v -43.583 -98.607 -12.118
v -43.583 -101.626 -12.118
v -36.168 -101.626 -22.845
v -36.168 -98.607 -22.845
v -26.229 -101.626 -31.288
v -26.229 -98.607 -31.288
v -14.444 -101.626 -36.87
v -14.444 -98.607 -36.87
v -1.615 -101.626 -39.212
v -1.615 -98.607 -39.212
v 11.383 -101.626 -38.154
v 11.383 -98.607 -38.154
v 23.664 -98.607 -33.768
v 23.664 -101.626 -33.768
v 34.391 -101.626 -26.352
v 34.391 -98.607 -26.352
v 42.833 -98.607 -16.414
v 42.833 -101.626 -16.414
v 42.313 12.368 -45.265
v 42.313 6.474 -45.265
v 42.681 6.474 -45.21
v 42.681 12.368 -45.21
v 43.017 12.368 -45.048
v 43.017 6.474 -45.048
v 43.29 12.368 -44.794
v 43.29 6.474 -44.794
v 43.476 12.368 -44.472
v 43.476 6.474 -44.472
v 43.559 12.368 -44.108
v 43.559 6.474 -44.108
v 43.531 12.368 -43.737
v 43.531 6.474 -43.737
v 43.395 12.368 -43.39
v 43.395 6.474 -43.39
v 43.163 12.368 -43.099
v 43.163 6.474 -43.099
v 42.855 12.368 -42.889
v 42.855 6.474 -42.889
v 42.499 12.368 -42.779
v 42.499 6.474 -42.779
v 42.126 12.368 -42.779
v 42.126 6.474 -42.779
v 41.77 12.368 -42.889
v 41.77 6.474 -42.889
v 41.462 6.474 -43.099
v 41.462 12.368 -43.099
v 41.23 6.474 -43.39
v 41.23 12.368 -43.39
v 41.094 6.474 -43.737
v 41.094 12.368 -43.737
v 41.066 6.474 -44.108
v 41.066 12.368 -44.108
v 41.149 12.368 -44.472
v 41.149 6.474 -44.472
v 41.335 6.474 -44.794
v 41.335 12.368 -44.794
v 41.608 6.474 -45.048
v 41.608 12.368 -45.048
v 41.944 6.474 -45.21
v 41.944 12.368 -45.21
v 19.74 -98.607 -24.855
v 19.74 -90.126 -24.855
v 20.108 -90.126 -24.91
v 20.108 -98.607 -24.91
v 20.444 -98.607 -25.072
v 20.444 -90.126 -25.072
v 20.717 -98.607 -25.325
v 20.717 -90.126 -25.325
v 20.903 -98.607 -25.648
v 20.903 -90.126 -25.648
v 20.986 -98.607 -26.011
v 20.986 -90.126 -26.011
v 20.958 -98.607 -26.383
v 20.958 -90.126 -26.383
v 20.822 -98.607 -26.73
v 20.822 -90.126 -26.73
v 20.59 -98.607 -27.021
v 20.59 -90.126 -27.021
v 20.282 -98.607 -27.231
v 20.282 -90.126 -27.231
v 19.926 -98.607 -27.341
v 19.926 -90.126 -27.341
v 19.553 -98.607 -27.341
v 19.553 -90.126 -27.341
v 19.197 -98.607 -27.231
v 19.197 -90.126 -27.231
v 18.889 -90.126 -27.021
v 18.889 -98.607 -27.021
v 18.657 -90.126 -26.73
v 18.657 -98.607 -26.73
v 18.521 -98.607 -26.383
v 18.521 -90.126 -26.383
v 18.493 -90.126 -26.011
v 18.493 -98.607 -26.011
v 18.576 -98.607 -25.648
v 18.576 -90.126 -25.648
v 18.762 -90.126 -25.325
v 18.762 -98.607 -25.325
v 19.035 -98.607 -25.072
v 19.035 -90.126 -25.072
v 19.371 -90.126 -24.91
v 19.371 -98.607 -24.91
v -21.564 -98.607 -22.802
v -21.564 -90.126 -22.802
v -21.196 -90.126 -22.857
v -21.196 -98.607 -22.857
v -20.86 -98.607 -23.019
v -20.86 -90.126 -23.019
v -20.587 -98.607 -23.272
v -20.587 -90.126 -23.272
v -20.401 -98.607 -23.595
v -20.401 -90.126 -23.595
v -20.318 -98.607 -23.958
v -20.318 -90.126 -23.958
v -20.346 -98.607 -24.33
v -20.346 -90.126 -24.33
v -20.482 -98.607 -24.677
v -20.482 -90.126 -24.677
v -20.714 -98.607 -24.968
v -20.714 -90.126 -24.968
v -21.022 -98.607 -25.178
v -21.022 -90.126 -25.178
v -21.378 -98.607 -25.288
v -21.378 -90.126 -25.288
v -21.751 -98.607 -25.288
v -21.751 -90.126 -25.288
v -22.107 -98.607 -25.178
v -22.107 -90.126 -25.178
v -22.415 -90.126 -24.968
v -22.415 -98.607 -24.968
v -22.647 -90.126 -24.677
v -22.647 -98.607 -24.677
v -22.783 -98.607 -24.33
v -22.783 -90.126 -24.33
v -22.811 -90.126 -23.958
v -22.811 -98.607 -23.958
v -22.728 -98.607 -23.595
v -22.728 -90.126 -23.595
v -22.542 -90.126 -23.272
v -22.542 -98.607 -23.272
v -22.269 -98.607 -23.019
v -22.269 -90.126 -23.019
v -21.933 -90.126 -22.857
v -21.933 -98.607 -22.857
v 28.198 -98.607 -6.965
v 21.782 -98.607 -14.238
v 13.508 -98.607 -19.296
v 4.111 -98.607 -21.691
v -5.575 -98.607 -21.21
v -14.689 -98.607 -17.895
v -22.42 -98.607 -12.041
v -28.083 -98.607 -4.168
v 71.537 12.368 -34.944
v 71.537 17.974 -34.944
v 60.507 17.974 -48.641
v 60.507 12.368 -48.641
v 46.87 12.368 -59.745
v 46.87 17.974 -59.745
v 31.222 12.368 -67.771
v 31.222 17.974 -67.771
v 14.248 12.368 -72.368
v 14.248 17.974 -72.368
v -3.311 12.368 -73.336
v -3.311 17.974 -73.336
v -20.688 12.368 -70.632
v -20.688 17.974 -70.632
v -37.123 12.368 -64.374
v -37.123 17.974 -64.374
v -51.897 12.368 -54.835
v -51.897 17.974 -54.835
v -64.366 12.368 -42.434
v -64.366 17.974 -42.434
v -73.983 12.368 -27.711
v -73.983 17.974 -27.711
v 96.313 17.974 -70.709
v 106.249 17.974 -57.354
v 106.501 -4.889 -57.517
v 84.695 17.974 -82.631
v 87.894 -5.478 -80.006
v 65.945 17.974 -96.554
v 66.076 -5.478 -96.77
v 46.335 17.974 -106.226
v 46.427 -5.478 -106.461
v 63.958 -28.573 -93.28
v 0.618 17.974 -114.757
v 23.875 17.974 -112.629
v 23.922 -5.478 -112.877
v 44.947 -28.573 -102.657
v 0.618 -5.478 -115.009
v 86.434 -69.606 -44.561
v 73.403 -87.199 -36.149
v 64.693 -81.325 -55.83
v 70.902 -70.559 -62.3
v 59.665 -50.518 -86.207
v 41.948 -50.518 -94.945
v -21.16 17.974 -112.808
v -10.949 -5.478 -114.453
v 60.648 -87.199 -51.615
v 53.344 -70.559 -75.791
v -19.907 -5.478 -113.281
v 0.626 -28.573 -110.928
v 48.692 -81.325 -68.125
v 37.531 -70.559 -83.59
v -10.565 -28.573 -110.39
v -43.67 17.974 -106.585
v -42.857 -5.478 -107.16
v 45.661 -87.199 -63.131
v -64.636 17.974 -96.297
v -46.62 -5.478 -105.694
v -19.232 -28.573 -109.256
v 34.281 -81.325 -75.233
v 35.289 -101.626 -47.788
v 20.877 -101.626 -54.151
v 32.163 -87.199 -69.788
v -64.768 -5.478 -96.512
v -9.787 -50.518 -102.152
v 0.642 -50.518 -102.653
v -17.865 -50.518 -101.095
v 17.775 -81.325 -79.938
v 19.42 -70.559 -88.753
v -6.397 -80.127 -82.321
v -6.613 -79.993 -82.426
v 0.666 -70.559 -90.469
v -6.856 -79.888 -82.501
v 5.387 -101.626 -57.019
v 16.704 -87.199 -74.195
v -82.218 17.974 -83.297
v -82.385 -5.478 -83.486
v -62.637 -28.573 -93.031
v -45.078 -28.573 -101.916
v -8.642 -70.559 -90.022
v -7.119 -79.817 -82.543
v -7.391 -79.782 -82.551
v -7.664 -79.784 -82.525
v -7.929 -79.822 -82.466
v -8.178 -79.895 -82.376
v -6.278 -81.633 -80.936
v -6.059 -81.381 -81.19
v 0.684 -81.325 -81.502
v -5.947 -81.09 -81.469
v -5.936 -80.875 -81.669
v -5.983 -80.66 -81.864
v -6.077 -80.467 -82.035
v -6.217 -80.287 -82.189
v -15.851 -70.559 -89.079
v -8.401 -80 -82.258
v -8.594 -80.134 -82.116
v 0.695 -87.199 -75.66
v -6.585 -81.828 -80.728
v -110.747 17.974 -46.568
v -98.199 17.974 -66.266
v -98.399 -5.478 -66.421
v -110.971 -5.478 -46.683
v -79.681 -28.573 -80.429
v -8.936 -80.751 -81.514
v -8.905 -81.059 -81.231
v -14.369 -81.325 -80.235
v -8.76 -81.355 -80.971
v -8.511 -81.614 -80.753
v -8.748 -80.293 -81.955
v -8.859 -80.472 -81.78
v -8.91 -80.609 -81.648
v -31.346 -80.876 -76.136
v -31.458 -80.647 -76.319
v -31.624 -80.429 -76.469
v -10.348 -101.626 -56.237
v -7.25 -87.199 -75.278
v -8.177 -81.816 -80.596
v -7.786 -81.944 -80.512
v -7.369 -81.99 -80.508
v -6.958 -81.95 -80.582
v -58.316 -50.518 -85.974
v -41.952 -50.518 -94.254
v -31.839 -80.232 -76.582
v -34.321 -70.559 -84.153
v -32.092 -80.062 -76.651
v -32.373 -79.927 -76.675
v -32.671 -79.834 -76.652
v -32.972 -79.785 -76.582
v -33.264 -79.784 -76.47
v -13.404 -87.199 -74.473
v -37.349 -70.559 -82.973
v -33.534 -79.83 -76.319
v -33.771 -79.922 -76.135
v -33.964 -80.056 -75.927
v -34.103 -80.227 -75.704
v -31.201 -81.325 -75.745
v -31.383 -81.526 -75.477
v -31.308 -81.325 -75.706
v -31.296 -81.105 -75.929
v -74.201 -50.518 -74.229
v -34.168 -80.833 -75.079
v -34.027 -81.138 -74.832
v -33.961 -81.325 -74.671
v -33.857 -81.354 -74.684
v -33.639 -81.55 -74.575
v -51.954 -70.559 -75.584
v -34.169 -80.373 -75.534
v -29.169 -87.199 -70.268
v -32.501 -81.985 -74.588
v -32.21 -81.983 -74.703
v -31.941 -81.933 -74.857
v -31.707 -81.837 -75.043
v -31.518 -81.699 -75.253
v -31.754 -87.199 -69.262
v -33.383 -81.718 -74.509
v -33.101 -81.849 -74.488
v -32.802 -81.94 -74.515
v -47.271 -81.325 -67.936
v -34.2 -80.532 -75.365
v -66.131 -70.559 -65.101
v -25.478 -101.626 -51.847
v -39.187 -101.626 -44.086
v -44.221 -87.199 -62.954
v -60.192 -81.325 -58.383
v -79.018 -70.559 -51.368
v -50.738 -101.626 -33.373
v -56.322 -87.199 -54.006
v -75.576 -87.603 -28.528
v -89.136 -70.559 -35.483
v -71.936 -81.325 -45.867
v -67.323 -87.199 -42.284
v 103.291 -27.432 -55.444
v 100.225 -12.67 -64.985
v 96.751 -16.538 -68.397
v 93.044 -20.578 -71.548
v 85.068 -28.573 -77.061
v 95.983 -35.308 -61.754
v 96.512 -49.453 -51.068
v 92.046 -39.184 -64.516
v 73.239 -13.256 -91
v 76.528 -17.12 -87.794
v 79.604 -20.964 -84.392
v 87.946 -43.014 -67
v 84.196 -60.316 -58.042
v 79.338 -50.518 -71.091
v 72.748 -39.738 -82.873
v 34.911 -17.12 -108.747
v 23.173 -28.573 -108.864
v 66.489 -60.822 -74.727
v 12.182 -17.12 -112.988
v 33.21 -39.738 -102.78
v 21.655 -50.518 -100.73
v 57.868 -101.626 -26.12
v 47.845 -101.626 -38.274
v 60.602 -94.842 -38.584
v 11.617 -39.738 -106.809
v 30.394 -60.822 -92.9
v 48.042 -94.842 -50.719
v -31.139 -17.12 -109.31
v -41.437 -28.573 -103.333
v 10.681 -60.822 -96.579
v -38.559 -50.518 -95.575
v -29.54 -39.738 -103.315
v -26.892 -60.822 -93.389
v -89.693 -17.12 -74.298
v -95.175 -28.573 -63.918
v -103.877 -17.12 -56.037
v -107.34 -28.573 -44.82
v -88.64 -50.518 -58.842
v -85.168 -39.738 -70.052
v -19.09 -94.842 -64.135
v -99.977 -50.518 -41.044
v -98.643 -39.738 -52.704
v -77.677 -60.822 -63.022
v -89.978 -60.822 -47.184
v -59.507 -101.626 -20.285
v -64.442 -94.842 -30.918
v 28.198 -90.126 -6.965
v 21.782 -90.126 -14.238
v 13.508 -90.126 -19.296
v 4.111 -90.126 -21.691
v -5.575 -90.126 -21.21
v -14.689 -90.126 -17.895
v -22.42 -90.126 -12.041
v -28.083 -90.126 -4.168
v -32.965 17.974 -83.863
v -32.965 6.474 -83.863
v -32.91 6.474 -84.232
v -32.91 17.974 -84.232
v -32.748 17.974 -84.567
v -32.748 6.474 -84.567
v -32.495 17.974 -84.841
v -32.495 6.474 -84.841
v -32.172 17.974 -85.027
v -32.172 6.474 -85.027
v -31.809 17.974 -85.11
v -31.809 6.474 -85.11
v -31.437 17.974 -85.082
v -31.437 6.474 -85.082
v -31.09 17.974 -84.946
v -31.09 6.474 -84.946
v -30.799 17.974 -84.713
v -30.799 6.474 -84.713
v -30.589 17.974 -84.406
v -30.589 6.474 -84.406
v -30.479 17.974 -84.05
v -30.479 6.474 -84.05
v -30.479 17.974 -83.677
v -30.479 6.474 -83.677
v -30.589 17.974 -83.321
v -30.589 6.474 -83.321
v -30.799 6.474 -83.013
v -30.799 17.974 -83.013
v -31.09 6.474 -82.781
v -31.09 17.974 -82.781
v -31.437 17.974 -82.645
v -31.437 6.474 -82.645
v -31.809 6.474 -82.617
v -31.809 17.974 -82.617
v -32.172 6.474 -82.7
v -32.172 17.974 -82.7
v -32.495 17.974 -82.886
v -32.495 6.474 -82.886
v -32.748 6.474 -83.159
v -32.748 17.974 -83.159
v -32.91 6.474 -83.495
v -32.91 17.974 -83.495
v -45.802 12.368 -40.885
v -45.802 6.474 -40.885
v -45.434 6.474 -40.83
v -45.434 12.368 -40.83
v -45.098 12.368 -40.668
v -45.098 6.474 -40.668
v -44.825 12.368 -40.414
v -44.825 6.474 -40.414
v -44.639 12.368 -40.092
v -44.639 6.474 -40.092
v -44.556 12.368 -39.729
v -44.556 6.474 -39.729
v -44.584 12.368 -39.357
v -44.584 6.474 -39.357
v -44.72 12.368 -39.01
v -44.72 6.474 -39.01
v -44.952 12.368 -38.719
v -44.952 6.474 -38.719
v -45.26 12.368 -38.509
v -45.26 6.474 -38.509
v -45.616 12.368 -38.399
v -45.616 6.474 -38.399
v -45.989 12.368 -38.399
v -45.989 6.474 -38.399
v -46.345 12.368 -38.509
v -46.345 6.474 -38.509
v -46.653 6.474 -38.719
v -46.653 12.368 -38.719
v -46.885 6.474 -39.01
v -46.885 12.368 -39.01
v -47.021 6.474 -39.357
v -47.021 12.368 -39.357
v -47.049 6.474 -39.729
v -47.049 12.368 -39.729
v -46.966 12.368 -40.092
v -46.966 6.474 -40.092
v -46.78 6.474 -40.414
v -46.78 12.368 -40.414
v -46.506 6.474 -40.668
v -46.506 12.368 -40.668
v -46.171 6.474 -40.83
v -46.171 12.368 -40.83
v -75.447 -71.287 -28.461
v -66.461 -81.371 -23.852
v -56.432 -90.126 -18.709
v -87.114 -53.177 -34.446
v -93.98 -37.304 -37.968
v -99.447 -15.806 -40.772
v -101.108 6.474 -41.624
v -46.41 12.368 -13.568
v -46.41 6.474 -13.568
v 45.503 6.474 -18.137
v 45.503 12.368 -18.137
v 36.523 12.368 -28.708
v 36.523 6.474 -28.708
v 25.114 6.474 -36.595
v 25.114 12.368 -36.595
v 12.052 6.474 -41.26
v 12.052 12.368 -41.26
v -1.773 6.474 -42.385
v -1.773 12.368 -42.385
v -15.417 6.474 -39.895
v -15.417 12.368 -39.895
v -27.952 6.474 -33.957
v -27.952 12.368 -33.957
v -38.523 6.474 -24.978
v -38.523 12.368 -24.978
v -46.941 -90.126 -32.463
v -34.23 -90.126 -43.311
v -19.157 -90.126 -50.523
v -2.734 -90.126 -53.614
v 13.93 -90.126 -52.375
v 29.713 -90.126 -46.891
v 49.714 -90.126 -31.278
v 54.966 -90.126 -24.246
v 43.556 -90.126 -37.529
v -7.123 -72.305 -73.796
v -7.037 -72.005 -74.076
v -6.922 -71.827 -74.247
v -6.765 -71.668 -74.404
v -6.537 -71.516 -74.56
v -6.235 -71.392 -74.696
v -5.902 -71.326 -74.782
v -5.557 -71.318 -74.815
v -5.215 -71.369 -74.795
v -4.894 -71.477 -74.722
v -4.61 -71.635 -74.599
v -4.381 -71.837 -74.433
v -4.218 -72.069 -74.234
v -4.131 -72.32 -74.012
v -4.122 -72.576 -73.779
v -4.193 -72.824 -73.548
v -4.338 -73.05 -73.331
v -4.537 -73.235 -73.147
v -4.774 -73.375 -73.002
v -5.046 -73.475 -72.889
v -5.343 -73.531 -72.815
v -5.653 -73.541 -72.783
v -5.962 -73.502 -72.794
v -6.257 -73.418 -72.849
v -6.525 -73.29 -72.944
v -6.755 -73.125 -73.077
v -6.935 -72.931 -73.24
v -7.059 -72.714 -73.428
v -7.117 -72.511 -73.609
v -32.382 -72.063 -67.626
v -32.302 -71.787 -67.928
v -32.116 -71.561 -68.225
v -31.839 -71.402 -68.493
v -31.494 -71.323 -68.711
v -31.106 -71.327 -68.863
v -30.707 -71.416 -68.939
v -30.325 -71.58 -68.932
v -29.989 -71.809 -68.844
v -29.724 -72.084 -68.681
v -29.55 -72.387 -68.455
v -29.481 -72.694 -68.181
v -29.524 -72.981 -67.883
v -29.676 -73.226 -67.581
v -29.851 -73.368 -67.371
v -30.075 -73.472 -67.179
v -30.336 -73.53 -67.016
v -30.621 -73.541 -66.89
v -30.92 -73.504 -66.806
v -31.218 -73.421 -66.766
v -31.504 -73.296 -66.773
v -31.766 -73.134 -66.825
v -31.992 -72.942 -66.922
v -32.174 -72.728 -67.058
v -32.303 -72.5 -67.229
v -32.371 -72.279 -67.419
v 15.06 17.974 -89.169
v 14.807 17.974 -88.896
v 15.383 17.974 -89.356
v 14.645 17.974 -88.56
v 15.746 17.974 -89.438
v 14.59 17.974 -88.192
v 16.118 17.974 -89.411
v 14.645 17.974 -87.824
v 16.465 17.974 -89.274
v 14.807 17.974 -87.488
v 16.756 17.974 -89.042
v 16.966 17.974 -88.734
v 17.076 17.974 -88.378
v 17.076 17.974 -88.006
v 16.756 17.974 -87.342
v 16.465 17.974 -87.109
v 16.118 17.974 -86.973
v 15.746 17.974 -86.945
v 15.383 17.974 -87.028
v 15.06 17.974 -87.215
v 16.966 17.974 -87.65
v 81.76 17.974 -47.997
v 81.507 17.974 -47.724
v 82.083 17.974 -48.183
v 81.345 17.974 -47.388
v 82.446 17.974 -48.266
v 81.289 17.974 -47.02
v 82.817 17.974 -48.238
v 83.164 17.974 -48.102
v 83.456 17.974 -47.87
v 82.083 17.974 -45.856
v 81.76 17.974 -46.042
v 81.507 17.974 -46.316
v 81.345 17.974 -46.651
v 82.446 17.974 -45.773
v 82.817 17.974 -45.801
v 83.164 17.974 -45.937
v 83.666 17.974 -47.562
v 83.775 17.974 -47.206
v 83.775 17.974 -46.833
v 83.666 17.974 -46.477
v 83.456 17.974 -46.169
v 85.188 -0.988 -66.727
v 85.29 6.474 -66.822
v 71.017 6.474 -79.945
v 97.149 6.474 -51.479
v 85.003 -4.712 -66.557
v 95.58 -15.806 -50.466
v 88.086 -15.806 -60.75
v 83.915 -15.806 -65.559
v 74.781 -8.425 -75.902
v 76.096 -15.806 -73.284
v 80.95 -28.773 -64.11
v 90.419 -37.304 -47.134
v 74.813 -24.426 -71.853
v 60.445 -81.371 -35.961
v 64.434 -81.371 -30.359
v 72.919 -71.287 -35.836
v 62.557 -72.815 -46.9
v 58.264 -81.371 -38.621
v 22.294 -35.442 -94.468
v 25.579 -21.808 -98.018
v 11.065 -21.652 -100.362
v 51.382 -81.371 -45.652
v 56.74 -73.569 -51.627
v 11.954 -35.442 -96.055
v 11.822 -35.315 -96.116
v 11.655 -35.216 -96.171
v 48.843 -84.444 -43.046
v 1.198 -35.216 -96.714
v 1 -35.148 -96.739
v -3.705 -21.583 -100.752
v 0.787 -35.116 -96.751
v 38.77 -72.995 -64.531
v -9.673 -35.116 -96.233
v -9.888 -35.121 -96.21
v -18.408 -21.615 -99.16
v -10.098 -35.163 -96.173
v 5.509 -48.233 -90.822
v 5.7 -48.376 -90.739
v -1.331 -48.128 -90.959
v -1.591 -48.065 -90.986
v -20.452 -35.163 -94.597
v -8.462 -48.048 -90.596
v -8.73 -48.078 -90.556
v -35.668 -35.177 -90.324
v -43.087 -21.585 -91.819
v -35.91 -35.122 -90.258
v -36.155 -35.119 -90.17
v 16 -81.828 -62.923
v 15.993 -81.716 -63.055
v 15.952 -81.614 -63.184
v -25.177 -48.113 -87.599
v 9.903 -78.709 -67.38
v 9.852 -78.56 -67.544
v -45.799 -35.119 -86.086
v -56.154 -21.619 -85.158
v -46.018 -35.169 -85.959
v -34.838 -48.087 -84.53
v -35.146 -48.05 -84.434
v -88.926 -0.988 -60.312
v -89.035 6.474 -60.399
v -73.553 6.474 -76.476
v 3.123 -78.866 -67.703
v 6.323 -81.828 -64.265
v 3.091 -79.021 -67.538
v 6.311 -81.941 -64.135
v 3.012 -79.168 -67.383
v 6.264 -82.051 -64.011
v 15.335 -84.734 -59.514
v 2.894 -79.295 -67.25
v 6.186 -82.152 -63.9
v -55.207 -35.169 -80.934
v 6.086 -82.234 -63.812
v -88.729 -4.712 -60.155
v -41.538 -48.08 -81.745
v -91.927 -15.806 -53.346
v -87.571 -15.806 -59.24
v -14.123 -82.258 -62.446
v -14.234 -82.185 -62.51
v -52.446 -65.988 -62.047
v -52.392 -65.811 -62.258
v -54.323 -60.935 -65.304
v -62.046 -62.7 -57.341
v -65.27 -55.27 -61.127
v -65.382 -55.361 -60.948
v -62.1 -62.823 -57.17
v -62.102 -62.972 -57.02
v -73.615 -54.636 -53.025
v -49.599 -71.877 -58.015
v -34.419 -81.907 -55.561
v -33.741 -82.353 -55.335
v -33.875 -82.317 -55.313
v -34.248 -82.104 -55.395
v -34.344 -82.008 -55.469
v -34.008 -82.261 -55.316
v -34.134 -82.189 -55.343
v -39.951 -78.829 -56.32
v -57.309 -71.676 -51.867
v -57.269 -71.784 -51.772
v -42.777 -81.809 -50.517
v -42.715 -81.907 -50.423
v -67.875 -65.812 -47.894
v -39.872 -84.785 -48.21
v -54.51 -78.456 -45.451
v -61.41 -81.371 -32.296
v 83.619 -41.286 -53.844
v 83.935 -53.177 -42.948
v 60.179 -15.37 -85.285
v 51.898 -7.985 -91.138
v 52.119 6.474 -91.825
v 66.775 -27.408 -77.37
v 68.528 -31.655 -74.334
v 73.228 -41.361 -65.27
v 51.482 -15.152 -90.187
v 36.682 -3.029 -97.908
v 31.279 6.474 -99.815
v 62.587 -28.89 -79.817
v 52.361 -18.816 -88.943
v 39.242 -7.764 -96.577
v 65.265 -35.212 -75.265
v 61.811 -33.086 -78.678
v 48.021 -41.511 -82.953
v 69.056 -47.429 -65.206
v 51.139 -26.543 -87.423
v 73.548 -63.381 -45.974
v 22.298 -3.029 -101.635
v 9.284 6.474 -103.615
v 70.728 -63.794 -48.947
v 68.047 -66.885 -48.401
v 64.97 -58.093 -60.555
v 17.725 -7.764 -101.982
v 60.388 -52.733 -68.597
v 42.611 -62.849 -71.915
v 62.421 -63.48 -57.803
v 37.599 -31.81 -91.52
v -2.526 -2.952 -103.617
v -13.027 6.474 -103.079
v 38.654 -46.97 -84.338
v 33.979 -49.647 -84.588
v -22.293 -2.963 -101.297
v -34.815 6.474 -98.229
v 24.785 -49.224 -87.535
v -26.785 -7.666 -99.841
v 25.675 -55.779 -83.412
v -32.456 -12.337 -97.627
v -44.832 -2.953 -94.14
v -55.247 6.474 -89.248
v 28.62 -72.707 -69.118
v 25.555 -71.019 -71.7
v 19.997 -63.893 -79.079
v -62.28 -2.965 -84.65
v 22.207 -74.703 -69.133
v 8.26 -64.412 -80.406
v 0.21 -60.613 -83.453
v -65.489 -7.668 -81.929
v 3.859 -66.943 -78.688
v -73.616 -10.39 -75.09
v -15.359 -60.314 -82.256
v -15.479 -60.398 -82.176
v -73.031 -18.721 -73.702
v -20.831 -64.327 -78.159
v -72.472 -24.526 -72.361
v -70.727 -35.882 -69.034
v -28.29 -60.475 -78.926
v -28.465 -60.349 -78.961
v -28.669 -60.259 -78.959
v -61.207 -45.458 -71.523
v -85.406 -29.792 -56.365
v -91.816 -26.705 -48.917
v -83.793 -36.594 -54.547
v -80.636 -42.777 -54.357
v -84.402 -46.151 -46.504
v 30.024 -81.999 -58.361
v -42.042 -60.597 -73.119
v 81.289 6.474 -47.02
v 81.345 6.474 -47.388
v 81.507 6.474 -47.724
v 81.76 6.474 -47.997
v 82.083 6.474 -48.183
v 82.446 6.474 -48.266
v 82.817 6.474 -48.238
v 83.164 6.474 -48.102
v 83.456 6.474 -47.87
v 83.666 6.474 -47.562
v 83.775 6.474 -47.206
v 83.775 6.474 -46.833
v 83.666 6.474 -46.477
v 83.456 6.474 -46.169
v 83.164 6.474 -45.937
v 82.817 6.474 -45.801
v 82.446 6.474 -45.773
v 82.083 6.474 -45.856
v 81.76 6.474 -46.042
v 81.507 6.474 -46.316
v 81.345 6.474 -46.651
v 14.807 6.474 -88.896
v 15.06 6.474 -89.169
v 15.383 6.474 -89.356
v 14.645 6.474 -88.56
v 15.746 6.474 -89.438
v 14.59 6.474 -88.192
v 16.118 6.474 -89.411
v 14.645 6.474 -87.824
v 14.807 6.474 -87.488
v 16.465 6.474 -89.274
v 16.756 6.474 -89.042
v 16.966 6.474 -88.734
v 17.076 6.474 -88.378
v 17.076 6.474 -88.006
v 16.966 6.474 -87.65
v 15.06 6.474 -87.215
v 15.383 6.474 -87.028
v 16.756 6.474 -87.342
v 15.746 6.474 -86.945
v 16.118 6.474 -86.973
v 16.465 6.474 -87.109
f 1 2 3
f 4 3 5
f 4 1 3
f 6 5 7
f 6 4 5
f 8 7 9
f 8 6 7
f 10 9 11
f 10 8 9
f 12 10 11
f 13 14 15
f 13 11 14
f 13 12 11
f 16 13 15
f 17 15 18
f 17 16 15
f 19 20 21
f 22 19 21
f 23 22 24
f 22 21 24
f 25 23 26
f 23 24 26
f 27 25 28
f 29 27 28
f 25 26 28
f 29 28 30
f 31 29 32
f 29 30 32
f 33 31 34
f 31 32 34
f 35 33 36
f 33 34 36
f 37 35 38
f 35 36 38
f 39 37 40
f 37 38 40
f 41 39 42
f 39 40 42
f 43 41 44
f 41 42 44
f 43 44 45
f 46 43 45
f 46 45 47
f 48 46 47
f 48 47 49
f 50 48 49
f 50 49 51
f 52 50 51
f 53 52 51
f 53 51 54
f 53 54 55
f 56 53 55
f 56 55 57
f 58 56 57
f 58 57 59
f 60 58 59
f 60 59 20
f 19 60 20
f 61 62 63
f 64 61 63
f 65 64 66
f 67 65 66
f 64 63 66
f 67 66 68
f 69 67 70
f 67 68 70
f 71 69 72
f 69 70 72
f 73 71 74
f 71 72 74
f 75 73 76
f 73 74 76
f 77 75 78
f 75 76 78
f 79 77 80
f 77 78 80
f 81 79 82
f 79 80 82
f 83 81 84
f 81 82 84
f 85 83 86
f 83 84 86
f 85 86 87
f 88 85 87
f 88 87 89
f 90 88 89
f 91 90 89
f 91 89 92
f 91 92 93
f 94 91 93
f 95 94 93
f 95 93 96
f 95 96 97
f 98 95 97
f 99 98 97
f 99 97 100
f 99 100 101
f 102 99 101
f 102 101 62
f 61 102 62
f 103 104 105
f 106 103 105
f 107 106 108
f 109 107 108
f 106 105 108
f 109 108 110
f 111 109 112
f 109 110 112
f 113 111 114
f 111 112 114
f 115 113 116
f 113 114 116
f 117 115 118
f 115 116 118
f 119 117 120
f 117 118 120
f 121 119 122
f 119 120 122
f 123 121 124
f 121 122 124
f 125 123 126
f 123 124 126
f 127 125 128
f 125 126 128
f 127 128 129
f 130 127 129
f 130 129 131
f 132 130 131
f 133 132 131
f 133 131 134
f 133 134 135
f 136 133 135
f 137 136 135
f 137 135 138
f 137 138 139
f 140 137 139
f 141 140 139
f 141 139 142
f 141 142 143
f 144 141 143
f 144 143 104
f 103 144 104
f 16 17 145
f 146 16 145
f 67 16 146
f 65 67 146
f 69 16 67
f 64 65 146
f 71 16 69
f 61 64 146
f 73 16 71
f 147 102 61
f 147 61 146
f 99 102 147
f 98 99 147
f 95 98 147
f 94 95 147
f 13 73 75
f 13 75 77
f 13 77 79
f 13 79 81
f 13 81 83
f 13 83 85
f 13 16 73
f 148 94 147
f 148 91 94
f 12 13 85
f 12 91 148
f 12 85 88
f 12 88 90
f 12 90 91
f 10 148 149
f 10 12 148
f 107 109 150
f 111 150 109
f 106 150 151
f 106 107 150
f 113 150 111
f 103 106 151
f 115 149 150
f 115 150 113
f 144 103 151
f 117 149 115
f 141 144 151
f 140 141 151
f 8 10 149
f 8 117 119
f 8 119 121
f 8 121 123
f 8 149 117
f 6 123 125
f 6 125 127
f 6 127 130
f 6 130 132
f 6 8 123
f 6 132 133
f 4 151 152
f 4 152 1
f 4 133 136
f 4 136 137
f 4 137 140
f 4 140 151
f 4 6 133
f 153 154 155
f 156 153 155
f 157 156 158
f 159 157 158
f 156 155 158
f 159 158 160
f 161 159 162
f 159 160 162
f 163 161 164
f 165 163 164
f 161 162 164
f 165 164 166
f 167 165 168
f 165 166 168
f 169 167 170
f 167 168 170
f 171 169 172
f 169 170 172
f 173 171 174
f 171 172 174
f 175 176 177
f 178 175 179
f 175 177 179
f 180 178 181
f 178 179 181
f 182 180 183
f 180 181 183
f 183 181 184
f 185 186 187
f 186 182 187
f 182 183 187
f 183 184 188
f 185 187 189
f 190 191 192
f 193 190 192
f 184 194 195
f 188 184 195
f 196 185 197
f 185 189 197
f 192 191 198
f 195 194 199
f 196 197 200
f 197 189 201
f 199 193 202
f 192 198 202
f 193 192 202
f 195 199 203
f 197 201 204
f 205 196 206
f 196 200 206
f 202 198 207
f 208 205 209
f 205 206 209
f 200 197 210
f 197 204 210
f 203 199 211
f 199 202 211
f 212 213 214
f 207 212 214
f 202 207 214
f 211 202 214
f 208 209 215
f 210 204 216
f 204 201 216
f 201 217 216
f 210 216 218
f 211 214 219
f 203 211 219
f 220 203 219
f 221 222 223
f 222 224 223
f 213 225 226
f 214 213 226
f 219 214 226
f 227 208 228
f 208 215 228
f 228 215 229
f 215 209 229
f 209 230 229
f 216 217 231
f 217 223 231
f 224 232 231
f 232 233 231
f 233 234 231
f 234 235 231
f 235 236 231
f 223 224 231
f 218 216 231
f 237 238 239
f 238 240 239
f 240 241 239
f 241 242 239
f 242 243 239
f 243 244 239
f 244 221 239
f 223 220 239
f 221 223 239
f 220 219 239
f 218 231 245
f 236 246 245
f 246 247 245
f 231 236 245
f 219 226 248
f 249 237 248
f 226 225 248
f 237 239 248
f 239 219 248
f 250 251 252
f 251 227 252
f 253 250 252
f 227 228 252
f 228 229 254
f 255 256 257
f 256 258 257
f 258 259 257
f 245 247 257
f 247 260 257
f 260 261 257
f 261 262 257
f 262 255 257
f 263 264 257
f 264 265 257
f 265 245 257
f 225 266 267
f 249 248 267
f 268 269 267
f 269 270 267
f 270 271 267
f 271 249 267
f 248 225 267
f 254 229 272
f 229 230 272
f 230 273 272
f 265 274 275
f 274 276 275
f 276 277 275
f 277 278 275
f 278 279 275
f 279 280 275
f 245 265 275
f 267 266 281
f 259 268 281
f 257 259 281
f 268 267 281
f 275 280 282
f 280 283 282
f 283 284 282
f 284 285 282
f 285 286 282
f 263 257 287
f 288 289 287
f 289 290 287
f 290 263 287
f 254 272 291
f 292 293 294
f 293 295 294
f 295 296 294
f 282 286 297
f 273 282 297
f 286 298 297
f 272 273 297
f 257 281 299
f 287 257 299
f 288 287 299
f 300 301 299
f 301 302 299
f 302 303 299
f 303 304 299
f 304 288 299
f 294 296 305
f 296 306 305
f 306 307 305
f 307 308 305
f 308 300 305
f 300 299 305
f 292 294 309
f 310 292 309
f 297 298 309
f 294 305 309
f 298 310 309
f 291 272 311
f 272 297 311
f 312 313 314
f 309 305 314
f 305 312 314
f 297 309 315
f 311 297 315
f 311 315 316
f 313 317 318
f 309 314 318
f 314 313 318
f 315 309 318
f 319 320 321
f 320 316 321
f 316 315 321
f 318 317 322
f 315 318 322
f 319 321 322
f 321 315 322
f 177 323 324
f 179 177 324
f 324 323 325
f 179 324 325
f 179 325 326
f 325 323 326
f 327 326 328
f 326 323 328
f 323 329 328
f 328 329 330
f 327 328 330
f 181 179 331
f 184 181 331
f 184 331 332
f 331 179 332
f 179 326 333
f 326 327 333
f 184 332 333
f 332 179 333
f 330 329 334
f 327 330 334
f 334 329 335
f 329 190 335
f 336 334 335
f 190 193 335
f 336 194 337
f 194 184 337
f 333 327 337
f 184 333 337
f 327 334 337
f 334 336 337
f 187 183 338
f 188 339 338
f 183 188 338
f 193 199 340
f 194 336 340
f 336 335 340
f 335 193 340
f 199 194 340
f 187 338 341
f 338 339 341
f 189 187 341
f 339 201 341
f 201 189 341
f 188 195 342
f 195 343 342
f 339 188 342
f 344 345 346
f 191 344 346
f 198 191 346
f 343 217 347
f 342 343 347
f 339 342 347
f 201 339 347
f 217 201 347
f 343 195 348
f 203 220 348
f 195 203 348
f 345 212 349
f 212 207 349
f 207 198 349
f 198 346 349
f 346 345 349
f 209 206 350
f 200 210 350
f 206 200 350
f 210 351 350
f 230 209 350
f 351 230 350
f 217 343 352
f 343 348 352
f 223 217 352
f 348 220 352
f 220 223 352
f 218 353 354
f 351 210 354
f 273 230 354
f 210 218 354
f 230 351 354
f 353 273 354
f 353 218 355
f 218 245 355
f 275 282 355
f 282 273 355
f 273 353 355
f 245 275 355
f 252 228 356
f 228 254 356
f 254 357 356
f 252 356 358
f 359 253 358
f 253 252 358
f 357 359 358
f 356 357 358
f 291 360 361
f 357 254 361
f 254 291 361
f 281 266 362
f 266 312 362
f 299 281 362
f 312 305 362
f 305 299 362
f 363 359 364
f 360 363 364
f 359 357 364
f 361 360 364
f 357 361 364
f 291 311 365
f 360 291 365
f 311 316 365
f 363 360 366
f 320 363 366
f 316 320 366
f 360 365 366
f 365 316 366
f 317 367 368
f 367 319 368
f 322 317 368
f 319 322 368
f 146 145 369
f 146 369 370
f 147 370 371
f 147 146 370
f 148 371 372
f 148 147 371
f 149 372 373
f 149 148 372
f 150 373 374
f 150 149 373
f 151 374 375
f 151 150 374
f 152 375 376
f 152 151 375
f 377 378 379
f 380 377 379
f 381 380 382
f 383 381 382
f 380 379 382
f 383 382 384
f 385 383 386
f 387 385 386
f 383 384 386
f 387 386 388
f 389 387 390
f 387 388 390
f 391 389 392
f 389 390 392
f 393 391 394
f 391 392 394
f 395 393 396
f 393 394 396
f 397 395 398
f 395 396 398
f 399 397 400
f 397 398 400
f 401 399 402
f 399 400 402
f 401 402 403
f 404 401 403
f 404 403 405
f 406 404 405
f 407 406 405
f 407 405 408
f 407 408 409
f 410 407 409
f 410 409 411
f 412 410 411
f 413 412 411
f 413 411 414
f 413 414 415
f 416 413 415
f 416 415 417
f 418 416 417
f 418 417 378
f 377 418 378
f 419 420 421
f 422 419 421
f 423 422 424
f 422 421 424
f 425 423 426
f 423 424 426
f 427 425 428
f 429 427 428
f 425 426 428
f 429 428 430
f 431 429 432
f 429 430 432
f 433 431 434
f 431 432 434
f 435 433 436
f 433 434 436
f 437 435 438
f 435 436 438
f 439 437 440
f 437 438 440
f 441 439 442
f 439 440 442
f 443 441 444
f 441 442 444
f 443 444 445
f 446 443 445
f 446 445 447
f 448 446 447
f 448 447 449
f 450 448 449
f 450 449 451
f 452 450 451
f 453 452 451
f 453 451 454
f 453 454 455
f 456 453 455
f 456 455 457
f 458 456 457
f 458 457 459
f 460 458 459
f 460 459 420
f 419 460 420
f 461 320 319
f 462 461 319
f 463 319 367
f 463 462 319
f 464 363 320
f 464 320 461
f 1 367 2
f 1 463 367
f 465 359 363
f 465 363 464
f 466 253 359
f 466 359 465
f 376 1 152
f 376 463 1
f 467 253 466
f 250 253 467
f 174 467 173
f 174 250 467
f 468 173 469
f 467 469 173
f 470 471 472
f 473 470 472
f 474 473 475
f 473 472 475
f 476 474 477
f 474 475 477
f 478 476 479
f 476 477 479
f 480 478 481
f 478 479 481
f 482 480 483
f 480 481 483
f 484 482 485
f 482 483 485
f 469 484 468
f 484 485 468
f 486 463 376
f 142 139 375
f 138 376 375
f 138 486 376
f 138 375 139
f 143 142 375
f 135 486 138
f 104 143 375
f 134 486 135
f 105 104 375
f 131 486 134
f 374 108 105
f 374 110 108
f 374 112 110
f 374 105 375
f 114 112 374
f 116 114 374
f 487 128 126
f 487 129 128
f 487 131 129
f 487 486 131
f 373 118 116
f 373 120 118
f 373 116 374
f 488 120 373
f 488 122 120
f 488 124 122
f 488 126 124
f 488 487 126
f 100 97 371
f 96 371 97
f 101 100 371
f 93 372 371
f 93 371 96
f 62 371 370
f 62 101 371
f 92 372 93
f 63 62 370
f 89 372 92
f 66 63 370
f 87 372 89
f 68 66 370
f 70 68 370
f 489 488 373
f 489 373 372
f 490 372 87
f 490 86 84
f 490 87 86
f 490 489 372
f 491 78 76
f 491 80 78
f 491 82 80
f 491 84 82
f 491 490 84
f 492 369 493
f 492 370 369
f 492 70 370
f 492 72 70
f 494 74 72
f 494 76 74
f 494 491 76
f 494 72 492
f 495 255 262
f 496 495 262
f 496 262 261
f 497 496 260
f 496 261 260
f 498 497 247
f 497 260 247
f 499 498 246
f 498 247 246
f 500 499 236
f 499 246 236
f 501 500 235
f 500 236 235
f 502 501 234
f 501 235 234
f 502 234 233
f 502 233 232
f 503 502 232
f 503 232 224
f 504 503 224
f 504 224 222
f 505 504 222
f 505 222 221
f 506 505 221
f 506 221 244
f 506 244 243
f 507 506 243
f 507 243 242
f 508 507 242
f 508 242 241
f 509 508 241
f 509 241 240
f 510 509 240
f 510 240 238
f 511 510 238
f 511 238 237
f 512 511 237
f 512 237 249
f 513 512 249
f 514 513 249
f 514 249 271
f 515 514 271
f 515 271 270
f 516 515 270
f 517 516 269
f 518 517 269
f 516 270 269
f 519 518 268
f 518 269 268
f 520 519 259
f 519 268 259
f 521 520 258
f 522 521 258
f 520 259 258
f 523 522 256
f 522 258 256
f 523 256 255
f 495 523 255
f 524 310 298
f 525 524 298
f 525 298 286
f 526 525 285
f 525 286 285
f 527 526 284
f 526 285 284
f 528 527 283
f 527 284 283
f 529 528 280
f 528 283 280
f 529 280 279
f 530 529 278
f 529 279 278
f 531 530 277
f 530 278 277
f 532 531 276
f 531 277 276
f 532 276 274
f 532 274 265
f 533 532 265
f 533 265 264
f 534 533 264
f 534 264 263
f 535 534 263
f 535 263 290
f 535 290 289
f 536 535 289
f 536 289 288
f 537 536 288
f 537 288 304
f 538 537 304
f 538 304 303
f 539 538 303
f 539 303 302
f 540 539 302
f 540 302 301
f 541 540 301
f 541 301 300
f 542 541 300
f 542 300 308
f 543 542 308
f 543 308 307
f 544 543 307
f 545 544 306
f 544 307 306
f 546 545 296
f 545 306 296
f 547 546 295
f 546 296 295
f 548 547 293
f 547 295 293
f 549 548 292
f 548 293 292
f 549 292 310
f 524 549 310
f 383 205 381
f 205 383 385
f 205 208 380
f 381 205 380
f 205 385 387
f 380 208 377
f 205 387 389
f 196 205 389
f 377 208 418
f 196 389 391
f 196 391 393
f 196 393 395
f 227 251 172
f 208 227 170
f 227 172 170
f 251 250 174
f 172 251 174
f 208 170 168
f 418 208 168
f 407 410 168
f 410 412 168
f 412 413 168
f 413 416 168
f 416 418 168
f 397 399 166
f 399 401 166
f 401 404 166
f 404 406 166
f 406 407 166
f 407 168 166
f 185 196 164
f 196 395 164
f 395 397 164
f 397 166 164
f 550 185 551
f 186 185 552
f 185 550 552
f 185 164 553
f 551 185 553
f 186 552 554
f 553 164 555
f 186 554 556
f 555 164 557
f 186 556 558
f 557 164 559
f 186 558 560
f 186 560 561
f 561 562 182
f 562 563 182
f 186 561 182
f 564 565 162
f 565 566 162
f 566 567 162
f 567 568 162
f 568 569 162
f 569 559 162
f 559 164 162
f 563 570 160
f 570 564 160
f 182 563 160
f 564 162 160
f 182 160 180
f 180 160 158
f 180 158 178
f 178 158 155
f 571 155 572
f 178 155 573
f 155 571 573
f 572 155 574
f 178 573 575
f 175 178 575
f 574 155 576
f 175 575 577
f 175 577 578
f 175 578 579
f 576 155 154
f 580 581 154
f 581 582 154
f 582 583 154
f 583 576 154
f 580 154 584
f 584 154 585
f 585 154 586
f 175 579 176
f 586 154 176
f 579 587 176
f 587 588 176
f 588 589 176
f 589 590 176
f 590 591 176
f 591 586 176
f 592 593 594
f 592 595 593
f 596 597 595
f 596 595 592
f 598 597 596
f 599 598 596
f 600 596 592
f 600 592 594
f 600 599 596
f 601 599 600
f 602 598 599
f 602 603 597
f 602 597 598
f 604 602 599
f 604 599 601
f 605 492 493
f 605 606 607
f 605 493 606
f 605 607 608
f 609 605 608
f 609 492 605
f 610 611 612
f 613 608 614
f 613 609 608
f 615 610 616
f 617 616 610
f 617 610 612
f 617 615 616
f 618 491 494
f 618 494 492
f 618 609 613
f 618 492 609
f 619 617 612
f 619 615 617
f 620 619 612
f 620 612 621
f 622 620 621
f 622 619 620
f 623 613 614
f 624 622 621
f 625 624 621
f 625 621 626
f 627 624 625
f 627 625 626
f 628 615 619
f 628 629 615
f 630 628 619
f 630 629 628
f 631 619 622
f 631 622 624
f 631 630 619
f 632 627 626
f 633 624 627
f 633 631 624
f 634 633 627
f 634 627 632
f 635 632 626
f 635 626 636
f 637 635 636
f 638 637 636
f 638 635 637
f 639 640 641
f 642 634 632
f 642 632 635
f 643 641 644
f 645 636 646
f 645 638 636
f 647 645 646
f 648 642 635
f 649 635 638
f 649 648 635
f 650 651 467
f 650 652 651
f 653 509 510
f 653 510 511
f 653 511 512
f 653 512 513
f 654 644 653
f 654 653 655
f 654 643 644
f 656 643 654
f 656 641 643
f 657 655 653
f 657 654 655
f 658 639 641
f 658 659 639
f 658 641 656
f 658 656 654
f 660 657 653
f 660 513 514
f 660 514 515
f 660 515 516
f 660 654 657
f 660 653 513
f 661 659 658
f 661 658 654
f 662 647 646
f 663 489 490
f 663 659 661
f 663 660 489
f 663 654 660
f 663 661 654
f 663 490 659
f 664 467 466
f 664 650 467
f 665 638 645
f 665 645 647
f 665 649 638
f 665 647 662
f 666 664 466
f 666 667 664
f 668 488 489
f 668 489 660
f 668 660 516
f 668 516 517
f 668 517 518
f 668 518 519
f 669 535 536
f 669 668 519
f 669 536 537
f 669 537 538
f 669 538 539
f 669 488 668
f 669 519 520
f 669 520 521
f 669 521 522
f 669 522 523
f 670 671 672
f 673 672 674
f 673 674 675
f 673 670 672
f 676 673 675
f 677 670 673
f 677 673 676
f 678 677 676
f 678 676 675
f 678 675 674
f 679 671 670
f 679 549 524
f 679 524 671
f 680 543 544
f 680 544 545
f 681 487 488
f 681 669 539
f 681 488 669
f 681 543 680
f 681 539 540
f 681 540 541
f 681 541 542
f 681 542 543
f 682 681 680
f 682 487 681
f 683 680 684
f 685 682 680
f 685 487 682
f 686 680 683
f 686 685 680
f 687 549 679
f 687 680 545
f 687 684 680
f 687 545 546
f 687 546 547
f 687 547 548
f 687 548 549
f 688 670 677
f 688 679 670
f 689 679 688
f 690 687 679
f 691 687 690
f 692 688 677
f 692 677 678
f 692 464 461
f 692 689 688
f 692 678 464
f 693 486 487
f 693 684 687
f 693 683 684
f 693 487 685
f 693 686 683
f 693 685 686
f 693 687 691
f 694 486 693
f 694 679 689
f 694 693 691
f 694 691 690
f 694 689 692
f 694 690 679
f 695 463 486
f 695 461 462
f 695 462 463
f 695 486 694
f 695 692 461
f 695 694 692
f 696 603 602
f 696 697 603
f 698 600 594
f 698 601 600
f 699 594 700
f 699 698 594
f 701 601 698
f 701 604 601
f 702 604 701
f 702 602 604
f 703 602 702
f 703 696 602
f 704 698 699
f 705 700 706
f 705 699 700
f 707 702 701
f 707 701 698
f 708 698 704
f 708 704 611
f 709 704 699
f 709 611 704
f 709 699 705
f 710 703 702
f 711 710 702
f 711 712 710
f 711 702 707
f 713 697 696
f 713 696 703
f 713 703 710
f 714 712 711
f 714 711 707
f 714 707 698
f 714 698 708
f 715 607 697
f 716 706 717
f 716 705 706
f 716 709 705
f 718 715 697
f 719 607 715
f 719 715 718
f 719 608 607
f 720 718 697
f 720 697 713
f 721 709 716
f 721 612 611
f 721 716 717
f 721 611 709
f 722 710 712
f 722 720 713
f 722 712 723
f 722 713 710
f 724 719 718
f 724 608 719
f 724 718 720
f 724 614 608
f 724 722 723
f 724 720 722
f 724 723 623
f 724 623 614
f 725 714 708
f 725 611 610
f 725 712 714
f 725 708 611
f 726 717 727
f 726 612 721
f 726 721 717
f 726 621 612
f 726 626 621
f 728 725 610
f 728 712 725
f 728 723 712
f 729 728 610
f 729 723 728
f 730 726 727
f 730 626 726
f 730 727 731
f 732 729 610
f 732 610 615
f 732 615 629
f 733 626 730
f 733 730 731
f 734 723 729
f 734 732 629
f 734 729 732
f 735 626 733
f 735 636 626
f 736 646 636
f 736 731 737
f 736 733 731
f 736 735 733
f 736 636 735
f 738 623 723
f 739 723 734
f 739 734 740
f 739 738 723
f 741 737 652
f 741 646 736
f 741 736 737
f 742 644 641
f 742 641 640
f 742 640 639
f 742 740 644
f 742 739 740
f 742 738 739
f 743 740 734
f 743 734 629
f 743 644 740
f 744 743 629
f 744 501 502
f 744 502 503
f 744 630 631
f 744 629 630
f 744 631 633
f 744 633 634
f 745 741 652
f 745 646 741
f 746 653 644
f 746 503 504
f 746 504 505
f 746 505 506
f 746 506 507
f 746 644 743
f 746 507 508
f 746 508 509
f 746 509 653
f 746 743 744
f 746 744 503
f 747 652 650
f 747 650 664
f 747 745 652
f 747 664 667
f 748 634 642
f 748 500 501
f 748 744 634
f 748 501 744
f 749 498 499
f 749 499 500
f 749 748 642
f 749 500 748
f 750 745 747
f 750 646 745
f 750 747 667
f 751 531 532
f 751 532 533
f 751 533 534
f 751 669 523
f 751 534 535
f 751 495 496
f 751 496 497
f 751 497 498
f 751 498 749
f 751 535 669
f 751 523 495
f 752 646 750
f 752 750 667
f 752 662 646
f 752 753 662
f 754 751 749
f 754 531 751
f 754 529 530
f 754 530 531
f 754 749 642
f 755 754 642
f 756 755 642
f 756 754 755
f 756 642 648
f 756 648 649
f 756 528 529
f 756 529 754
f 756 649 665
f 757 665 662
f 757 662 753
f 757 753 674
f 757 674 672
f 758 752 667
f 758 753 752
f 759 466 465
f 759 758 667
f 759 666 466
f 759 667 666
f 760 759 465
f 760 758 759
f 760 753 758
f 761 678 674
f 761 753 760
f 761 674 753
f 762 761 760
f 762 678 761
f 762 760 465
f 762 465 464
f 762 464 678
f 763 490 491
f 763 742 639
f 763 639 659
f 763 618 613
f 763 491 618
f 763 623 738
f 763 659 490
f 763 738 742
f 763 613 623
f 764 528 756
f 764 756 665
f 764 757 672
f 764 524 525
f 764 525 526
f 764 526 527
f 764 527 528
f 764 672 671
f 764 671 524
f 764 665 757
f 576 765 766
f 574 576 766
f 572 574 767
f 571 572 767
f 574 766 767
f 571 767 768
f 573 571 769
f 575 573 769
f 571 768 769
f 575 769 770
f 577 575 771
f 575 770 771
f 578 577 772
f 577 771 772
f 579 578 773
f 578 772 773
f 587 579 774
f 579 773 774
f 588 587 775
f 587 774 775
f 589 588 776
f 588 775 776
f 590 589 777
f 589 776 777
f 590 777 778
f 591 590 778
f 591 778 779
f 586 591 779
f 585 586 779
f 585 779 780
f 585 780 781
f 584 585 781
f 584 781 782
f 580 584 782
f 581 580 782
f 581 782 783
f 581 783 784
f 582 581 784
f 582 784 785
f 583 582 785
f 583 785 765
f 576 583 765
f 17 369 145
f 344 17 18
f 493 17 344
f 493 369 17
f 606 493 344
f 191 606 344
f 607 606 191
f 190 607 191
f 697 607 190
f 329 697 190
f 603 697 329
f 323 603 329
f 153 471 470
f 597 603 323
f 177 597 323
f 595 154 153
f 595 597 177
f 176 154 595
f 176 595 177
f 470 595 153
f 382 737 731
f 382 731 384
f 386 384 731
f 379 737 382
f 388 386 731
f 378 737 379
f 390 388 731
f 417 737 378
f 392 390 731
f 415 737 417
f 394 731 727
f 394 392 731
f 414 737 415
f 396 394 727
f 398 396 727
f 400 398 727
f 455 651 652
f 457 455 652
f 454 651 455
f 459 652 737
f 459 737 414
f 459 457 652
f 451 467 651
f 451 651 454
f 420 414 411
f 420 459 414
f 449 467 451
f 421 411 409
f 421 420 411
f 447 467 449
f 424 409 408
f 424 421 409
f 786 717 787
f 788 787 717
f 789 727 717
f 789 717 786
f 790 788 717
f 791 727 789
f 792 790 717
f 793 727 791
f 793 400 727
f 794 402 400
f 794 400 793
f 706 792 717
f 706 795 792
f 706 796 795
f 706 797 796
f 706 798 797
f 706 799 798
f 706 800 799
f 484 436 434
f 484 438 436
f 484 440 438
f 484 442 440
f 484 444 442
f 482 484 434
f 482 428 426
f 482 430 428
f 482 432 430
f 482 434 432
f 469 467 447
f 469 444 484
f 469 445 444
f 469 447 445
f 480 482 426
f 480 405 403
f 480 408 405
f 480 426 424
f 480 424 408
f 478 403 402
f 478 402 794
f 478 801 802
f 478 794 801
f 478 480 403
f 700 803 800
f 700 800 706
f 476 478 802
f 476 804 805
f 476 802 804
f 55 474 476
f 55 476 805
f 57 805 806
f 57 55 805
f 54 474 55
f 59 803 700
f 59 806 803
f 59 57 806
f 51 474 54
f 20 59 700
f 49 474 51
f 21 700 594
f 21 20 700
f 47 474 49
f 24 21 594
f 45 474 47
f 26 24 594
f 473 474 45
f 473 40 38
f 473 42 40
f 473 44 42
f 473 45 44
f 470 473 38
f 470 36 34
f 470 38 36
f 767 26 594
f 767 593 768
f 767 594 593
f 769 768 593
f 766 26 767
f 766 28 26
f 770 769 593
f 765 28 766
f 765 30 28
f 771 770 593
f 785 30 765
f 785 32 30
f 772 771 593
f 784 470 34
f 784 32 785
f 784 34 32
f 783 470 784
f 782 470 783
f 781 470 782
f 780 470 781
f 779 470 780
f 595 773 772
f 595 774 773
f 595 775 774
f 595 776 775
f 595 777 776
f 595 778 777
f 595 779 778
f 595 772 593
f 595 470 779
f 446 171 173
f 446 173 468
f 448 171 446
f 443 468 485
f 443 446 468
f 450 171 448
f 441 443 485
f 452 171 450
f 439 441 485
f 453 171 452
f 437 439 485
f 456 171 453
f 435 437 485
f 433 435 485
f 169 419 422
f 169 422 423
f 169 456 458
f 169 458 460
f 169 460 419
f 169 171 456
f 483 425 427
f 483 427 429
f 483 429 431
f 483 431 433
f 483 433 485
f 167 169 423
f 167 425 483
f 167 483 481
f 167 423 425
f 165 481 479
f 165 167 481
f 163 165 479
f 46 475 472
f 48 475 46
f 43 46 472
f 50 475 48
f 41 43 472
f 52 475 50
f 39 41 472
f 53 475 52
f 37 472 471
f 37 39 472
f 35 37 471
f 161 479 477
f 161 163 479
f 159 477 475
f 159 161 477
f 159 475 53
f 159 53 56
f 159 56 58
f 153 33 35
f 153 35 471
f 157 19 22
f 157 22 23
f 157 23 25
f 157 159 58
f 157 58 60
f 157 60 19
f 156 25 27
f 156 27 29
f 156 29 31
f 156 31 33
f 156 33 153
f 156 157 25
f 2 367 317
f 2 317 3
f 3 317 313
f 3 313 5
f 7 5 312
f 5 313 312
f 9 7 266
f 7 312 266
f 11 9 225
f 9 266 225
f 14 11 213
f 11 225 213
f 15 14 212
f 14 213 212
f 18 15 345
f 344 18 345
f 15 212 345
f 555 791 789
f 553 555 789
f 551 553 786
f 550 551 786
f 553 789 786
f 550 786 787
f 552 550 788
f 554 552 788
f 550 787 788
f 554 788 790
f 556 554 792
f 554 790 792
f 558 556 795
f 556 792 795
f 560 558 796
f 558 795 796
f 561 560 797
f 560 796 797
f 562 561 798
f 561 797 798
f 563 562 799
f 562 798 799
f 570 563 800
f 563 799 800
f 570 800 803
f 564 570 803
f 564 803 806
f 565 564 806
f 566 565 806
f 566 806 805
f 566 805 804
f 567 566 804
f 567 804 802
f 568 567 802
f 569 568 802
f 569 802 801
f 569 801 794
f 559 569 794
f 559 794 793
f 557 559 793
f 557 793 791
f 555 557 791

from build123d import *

# Parameters (mm, degrees)
ENL_V_MAT_EXTRU_1_DEPTH  = 205
ESQUISSE4_W              = 219.421497641
ESQUISSE4_H              = 186.787380576
ENL_V_MAT_EXTRU_2_DEPTH  = 241.082722882
COQUE2_T                 = -10
ENL_V_MAT_EXTRU_4_DEPTH  = 5
ENL_V_MAT_EXTRU_5_DEPTH  = 25
ENL_V_MAT_EXTRU_6_DEPTH  = 2.5
ENL_V_MAT_EXTRU_10_DEPTH = 15
ECHELLE1_SCALE           = 1.15
TROU_TARAUD_M32_D        = 2.5
TROU_TARAUD_M32_DEPTH    = 12.5
TROU_TARAUD_M32_TIP      = 0.751075774
TROU_TARAUD_M33_D        = 2.5
TROU_TARAUD_M33_DEPTH    = 12.5
TROU_TARAUD_M33_TIP      = 0.751075774
TROU_TARAUD_M35_D        = 2.5
TROU_TARAUD_M35_DEPTH    = 12.5
TROU_TARAUD_M35_TIP      = 0.751075774
ESQUISSE23_R             = 1.5
ENL_V_MAT_EXTRU_11_DEPTH = 40


with BuildPart() as part:
    # Esquisse1 → Révolution2 (revolve)
    with BuildSketch(Plane.XY):
        with BuildLine():
            Line((0.334149559, -92.625367455), (0.334149559, 171))
            ThreePointArc((0.334149559, 171), (43.341663836, 173.345331392), (83, 190.148998741))
            ThreePointArc((83, 190.148998741), (97.133928161, 161.990328143), (102, 130.86156331))
            add(Edge.make_bspline(
                [(102, 130.86156331), (103.479009077, 113.684745488), (71.205293421, 65.560678141), (110.707376512, 34.252457406), (109.358599643, 11.86156331)],
                knots=[0, 0, 0, 0, 0.406612523, 1, 1, 1, 1], degree=3))
            ThreePointArc((109.358599643, 11.86156331), (99.215374733, -47.500625433), (59.334149559, -92.625367455))
            Line((59.334149559, -92.625367455), (0.334149559, -92.625367455))
        make_face()
    revolve(axis=Axis((0.334149559, -92.625367455, 0), (0, 1, 0)))

    # Esquisse3 → Enlèv. mat.-Extru.1 (cut, symmetric)
    with BuildSketch(Plane(origin=(0, 0, 0), x_dir=(1, 0, 0), z_dir=(0, 1, 0))):
        with BuildLine():
            Line((-97.244399695, 50.050229554), (0.334149559, 0))
            Line((0.334149559, 0), (92.468194445, 59.480387742))
            ThreePointArc((92.468194445, 59.480387742), (5.778653928, -109.530617295), (-97.244399695, 50.050229554))
        make_face()
    extrude(amount=ENL_V_MAT_EXTRU_1_DEPTH, both=True, mode=Mode.SUBTRACT)

    # Esquisse4 → Enlèv. mat.-Extru.2 (cut, through all)
    with BuildSketch(Plane.XY):
        with Locations((-2.038050308, 104.768322833)):
            Rectangle(ESQUISSE4_W, ESQUISSE4_H)
    extrude(amount=-ENL_V_MAT_EXTRU_2_DEPTH, mode=Mode.SUBTRACT)

    # Coque2
    coque2_openings = [part.faces().sort_by_distance(p)[0] for p in [
        (41.688799169, -36.484898267, -26.697955102),
        (-43.464282683, -36.484897866, -22.465199622),
    ]]
    offset(amount=COQUE2_T, openings=coque2_openings, kind=Kind.INTERSECTION)

    # Esquisse6 → Enlèv. mat.-Extru.4 (cut)
    with BuildSketch(Plane(origin=(0, 11.5, 0), x_dir=(1, 0, 0), z_dir=(0, 1, 0))):
        with BuildLine():
            Line((-64.751451353, 33.383866548), (0.334149559, 0))
            Line((0.334149559, 0), (61.788226523, 39.673850536))
            ThreePointArc((61.788226523, 39.673850536), (-3.29737439, 73.057717085), (-64.751451353, 33.383866548))
        make_face()
    extrude(amount=-ENL_V_MAT_EXTRU_4_DEPTH, mode=Mode.SUBTRACT)

    # Esquisse7 → Enlèv. mat.-Extru.5 (cut)
    with BuildSketch(Plane(origin=(0, 11.5, 0), x_dir=(1, 0, 0), z_dir=(0, 1, 0))):
        with BuildLine():
            Line((-40.77485255, 21.085730501), (0.334149559, 0))
            Line((0.334149559, 0), (39.149428885, 25.0585749))
            ThreePointArc((39.149428885, 25.0585749), (-1.959573224, 46.144305401), (-40.77485255, 21.085730501))
        make_face()
    extrude(amount=-ENL_V_MAT_EXTRU_5_DEPTH, mode=Mode.SUBTRACT)

    # Esquisse8 → Enlèv. mat.-Extru.6 (cut, symmetric)
    with BuildSketch(Plane(origin=(0, -92.5, 0), x_dir=(1, 0, 0), z_dir=(0, 1, 0))):
        with BuildLine():
            Line((36.828161908, 23.559998993), (0.334149559, 0))
            Line((0.334149559, 0), (-38.316414256, 19.824742283))
            ThreePointArc((-38.316414256, 19.824742283), (-1.822401908, 43.384741276), (36.828161908, 23.559998993))
        make_face()
    extrude(amount=ENL_V_MAT_EXTRU_6_DEPTH, both=True, mode=Mode.SUBTRACT)

    # Esquisse10 → Enlèv. mat.-Extru.10 (cut)
    with BuildSketch(Plane(origin=(0, -92.5, 0), x_dir=(1, 0, 0), z_dir=(0, 1, 0))):
        with BuildLine():
            Line((-24.838107184, 12.911415859), (0.334149559, 0))
            Line((0.334149559, 0), (24.101892064, 15.344105881))
            ThreePointArc((24.101892064, 15.344105881), (-1.070364679, 28.25552174), (-24.838107184, 12.911415859))
        make_face()
    extrude(amount=ENL_V_MAT_EXTRU_10_DEPTH, mode=Mode.SUBTRACT)


with BuildPart() as part_1:
    # Echelle1: scaled about (-3.205196898, -32.62107135, -71.203315854)
    add(part.part.scale(ECHELLE1_SCALE).moved(Location((0.480779535, 4.893160702, 10.680497378))))

    # Trou taraudé M32
    with Locations(Plane(origin=(-21.564432755, -98.60683867, -24.05170562), x_dir=(0, 0, -1), z_dir=(0, -1, 0))):
        with Locations((0, 0), (2.053122984, 41.304003571)):
            Hole(TROU_TARAUD_M32_D / 2, depth=TROU_TARAUD_M32_DEPTH)
            with Locations((0, 0, -(TROU_TARAUD_M32_DEPTH + TROU_TARAUD_M32_TIP / 2))):  # 118° drill point
                Cone(0, TROU_TARAUD_M32_D / 2, TROU_TARAUD_M32_TIP, mode=Mode.SUBTRACT)

    # Trou taraudé M33
    with Locations(Plane(origin=(-45.802285112, 12.36816133, -39.635090601), x_dir=(0, 0, 1), z_dir=(0, 1, 0))):
        with Locations((0, 0), (-4.379976461, 88.114820569)):
            Hole(TROU_TARAUD_M33_D / 2, depth=TROU_TARAUD_M33_DEPTH)
            with Locations((0, 0, -(TROU_TARAUD_M33_DEPTH + TROU_TARAUD_M33_TIP / 2))):  # 118° drill point
                Cone(0, TROU_TARAUD_M33_D / 2, TROU_TARAUD_M33_TIP, mode=Mode.SUBTRACT)

    # Trou taraudé M35
    with Locations(Plane(origin=(82.53934023, 17.973988757, -47.019680031), x_dir=(1, 0, 0), z_dir=(0, 1, 0))):
        with Locations((0, 0), (-66.69965831, 41.172267137), (-114.254701281, 36.84355094)):
            Hole(TROU_TARAUD_M35_D / 2, depth=TROU_TARAUD_M35_DEPTH)
            with Locations((0, 0, -(TROU_TARAUD_M35_DEPTH + TROU_TARAUD_M35_TIP / 2))):  # 118° drill point
                Cone(0, TROU_TARAUD_M35_D / 2, TROU_TARAUD_M35_TIP, mode=Mode.SUBTRACT)

    # Esquisse23 → Enlèv. mat.-Extru.11 (cut)
    with BuildSketch(Plane(origin=(-19.273619273, -89.804688212, -82.066838873), x_dir=(-0.9876815415012294, 0.1155106334721785, 0.10555788048559506), z_dir=(-0.15647738679360396, -0.7291003694870504, -0.6662788294971496))):
        with Locations(Location((-10.604108873, 5.618400934, 0), (0, 0, 3.1152173))):
            Circle(ESQUISSE23_R)
        with Locations(Location((15.022911638, 1.230255574, 0), (0, 0, 2.971685795))):
            Circle(ESQUISSE23_R)
    extrude(amount=-ENL_V_MAT_EXTRU_11_DEPTH, mode=Mode.SUBTRACT)


solid = part_1.part
